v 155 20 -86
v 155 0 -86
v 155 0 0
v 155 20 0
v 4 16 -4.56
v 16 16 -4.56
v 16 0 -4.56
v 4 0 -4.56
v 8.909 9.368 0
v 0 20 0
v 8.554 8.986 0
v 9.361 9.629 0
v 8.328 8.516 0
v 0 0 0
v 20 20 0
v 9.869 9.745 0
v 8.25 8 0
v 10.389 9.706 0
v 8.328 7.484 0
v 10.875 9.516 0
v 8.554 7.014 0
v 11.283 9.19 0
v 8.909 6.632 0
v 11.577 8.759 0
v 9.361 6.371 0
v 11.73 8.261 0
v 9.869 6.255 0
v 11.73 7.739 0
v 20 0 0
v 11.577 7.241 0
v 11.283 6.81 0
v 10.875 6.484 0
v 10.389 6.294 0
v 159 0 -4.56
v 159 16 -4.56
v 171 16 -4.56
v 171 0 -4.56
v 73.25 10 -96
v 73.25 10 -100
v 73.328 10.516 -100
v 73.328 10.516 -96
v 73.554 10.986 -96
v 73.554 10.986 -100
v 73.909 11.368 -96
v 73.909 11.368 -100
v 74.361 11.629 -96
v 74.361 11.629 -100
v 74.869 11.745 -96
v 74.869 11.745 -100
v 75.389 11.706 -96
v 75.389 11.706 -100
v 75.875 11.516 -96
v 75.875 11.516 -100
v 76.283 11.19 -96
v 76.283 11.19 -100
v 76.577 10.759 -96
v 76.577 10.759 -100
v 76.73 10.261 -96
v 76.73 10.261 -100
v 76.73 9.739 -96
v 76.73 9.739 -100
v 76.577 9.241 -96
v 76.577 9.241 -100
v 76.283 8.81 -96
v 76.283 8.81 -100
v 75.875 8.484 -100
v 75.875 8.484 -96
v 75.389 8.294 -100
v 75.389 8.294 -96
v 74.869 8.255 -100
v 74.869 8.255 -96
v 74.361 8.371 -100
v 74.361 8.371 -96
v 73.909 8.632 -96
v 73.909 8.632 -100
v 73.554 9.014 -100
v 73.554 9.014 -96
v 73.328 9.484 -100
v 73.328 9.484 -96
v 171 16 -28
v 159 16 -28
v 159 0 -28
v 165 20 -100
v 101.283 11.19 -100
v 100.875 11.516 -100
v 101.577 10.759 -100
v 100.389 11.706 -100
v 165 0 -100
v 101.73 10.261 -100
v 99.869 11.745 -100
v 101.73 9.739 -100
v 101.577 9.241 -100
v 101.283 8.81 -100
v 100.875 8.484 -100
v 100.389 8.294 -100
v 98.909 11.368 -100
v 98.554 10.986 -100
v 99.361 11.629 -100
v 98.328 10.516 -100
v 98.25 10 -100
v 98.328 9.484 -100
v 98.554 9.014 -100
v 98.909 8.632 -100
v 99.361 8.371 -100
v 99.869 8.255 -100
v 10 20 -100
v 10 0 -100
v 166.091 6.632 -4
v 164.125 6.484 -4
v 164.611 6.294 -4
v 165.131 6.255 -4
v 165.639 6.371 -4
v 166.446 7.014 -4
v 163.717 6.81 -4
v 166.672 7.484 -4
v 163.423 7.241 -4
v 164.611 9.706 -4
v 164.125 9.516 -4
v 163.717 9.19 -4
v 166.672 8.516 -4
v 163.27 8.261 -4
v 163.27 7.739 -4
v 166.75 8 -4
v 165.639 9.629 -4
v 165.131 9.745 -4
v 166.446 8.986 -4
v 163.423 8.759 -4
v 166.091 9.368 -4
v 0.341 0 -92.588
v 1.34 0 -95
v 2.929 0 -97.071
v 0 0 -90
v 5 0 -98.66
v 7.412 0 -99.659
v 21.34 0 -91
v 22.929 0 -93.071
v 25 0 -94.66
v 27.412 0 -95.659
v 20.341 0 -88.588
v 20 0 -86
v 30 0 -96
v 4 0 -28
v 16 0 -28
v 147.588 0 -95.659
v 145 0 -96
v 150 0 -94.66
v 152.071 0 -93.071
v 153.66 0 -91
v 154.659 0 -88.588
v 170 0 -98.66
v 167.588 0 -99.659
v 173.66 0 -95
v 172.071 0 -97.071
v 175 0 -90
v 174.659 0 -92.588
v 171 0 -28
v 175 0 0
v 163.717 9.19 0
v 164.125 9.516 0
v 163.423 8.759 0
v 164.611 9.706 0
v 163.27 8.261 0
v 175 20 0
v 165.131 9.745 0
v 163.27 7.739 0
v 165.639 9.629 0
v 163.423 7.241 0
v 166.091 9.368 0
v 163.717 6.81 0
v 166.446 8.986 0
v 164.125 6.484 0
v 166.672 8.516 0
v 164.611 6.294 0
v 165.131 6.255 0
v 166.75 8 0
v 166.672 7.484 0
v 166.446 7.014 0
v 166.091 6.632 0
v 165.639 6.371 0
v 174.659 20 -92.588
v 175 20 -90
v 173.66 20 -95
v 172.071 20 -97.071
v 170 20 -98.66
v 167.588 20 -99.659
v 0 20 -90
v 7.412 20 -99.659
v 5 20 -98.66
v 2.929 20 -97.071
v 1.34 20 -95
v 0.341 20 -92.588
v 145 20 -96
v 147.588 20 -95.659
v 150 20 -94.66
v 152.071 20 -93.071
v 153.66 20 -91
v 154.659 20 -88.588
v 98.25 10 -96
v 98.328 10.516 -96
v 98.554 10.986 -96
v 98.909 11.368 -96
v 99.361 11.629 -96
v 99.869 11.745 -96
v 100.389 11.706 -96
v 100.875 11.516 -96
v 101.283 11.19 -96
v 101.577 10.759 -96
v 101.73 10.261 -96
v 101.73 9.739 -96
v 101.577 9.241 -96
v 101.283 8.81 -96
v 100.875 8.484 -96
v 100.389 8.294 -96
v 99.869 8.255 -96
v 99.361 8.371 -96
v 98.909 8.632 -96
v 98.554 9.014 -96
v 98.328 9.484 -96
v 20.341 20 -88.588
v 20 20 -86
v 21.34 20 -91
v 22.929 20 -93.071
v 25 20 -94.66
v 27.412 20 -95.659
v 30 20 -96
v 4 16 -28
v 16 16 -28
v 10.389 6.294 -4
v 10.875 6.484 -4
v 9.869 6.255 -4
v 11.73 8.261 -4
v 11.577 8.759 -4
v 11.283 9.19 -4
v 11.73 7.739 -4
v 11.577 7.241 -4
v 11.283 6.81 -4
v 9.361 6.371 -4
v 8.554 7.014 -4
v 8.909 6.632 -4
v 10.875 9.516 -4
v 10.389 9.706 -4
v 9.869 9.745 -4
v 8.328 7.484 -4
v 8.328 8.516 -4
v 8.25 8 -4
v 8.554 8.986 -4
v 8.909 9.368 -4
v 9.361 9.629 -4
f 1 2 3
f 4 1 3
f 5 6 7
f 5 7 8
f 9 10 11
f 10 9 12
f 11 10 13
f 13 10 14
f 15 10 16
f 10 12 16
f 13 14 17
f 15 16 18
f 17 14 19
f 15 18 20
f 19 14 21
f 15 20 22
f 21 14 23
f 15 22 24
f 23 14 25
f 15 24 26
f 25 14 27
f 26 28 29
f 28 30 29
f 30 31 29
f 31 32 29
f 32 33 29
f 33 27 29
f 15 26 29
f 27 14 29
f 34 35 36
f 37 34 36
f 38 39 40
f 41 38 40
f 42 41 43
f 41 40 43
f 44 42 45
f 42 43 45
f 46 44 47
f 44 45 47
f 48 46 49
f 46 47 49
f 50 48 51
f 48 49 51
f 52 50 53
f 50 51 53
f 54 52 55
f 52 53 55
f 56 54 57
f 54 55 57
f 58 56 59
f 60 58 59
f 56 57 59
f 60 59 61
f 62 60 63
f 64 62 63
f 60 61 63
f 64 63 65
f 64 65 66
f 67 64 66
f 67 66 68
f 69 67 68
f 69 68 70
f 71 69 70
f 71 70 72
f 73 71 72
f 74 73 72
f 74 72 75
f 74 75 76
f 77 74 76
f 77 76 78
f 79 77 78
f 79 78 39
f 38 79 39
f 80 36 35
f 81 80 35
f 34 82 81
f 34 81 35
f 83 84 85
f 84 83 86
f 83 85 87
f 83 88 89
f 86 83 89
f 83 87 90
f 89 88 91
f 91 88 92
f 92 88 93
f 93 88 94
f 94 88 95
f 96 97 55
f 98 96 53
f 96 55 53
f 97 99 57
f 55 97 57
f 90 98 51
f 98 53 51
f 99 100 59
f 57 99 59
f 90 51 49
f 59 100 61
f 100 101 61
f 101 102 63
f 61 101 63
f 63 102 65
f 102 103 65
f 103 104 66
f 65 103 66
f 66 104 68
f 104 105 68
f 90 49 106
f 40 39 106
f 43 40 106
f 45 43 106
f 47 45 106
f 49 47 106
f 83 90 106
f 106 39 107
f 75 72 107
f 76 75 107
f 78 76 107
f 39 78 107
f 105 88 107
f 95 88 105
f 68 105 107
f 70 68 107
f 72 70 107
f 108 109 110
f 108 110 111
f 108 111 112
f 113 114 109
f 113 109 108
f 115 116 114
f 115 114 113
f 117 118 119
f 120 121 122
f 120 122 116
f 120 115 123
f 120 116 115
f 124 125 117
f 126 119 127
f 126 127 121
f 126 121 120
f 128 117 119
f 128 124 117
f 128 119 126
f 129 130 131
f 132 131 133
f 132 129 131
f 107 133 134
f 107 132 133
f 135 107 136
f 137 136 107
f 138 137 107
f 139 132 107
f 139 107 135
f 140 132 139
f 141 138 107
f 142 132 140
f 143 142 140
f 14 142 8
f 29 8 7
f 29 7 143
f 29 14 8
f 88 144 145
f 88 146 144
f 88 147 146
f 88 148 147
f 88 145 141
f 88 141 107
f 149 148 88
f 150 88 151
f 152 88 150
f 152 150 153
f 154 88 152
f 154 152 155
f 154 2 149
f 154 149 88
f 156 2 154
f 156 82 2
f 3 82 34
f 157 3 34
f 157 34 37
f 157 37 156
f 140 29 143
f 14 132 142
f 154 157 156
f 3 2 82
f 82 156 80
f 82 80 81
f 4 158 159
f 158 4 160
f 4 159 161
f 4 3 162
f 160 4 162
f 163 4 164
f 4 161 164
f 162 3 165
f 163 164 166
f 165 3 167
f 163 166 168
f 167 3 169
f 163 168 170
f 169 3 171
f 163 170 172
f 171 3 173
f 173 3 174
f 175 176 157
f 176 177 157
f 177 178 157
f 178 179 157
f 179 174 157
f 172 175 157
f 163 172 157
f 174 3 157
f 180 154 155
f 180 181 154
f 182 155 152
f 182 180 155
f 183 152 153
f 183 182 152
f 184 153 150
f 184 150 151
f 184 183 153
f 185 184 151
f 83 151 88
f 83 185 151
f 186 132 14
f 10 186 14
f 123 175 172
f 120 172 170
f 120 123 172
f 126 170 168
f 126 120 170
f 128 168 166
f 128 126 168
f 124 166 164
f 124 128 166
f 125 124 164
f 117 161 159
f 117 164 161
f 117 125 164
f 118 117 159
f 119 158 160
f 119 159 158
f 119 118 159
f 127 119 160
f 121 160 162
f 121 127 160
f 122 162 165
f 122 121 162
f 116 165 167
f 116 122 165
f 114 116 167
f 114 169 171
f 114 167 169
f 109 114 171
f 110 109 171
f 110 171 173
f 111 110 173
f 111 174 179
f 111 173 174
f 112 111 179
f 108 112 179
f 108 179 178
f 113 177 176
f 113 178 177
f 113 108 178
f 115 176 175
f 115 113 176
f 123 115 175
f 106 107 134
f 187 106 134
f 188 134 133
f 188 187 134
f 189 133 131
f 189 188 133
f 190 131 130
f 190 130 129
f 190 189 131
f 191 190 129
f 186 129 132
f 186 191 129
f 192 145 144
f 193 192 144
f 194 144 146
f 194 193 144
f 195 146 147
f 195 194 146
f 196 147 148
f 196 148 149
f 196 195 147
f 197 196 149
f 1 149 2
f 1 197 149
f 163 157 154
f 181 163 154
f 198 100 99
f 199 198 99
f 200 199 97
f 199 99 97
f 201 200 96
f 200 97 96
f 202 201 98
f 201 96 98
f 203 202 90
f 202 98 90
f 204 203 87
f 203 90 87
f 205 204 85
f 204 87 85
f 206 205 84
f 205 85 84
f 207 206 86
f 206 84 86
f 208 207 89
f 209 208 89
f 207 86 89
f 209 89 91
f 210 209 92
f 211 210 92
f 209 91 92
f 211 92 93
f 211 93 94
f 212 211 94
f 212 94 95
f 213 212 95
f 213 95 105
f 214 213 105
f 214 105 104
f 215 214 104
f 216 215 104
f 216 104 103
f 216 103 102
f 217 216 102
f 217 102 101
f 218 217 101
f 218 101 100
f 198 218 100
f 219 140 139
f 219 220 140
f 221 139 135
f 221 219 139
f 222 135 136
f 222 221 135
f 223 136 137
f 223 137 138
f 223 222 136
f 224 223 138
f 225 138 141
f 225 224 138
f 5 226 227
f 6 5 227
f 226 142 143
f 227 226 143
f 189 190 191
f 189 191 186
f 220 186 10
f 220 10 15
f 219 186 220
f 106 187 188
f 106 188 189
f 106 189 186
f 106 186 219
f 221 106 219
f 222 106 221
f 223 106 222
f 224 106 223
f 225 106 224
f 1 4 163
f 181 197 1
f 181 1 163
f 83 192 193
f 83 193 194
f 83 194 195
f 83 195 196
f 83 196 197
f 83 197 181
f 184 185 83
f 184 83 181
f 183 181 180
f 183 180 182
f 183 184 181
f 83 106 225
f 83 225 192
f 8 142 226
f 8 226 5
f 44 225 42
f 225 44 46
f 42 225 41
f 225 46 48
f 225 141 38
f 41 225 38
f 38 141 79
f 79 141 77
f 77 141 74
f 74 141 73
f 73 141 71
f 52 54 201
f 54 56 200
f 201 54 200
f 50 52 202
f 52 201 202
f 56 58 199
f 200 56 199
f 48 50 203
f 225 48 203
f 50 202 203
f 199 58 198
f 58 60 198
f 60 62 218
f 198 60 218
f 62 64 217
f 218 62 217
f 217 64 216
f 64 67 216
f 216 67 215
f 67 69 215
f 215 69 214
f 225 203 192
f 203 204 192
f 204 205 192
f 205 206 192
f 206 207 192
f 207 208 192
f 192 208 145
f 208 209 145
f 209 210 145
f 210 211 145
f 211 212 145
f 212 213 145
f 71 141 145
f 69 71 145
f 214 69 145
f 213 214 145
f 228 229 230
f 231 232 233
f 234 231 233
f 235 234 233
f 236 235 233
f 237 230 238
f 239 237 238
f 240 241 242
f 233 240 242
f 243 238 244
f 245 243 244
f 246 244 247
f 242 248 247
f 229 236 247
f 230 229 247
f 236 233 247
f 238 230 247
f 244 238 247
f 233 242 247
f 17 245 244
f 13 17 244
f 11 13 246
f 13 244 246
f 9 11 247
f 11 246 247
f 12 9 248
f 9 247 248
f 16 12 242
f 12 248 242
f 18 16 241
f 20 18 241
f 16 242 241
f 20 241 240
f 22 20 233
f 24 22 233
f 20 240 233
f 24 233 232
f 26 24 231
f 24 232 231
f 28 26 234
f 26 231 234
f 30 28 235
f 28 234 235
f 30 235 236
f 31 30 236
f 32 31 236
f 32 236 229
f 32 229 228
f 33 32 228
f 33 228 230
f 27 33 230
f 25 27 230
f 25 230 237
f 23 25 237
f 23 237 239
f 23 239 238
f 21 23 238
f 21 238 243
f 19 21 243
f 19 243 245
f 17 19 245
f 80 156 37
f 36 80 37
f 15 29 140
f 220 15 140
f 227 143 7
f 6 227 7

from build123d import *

# Parameters (mm, degrees)
BOSS_EXTRUDE1_DEPTH = 20
FILLET1_R           = 10
SKETCH2_R           = 1.75
CUT_EXTRUDE1_DEPTH  = 203.546291005
SKETCH3_W           = 12
SKETCH3_H           = 24
CUT_EXTRUDE2_DEPTH  = 16
SKETCH4_R           = 1.75
CUT_EXTRUDE3_DEPTH  = 201.601595208
SKETCH6_W           = 12
SKETCH6_H           = 16
BOSS_EXTRUDE2_DEPTH = 0.56


with BuildPart() as part:
    # Sketch1 → Boss-Extrude1 (new body)
    with BuildSketch(Plane(origin=(0, 0, 0), x_dir=(1, 0, 0), z_dir=(0, 1, 0))):
        Polygon((0, 0), (20, 0), (20, 96), (155, 96), (155, 0), (175, 0), (175, 100), (0, 100), align=None)
    extrude(amount=BOSS_EXTRUDE1_DEPTH)

    # Fillet1
    fillet1_edges = [part.edges().sort_by_distance(p)[0] for p in [
        (0, 10, -100),
        (175, 10, -100),
        (155, 10, -96),
        (20, 10, -96),
    ]]
    fillet(fillet1_edges, radius=FILLET1_R)

    # Sketch2 → Cut-Extrude1 (cut, through all)
    with BuildSketch(Plane(origin=(0, 0, -100), x_dir=(-1, 0, 0), z_dir=(0, 0, -1))):
        with Locations((-100, 10)):
            Circle(SKETCH2_R)
        with Locations((-75, 10)):
            Circle(SKETCH2_R)
    extrude(amount=-CUT_EXTRUDE1_DEPTH, mode=Mode.SUBTRACT)

    # Sketch3 → Cut-Extrude2 (cut)
    with BuildSketch(Plane.XZ):
        with Locations((10, -16)):
            Rectangle(SKETCH3_W, SKETCH3_H)
    cut_extrude2 = extrude(amount=-CUT_EXTRUDE2_DEPTH, mode=Mode.SUBTRACT)

    # Sketch4 → Cut-Extrude3 (cut, through all)
    with BuildSketch(Plane(origin=(0, 0, -4), x_dir=(-1, 0, 0), z_dir=(0, 0, -1))):
        with Locations((-10, 8)):
            Circle(SKETCH4_R)
    cut_extrude3 = extrude(amount=-CUT_EXTRUDE3_DEPTH, mode=Mode.SUBTRACT)

    # Mirror1: Cut-Extrude2, Cut-Extrude3 across plane
    add(cut_extrude2.mirror(Plane(origin=(87.5, 0, 0), x_dir=(0, 0, 1), z_dir=(1, 0, 0))), mode=Mode.SUBTRACT)
    add(cut_extrude3.mirror(Plane(origin=(87.5, 0, 0), x_dir=(0, 0, 1), z_dir=(1, 0, 0))), mode=Mode.SUBTRACT)

    # Sketch6 → Boss-Extrude2 (add)
    with BuildSketch(Plane(origin=(0, 0, -4), x_dir=(-1, 0, 0), z_dir=(0, 0, -1))):
        with Locations((-10, 8)):
            Rectangle(SKETCH6_W, SKETCH6_H)
    boss_extrude2 = extrude(amount=BOSS_EXTRUDE2_DEPTH)

    # Mirror2: Boss-Extrude2 across plane
    add(boss_extrude2.mirror(Plane(origin=(87.5, 0, 0), x_dir=(0, 0, 1), z_dir=(1, 0, 0))))


solid = part.part
